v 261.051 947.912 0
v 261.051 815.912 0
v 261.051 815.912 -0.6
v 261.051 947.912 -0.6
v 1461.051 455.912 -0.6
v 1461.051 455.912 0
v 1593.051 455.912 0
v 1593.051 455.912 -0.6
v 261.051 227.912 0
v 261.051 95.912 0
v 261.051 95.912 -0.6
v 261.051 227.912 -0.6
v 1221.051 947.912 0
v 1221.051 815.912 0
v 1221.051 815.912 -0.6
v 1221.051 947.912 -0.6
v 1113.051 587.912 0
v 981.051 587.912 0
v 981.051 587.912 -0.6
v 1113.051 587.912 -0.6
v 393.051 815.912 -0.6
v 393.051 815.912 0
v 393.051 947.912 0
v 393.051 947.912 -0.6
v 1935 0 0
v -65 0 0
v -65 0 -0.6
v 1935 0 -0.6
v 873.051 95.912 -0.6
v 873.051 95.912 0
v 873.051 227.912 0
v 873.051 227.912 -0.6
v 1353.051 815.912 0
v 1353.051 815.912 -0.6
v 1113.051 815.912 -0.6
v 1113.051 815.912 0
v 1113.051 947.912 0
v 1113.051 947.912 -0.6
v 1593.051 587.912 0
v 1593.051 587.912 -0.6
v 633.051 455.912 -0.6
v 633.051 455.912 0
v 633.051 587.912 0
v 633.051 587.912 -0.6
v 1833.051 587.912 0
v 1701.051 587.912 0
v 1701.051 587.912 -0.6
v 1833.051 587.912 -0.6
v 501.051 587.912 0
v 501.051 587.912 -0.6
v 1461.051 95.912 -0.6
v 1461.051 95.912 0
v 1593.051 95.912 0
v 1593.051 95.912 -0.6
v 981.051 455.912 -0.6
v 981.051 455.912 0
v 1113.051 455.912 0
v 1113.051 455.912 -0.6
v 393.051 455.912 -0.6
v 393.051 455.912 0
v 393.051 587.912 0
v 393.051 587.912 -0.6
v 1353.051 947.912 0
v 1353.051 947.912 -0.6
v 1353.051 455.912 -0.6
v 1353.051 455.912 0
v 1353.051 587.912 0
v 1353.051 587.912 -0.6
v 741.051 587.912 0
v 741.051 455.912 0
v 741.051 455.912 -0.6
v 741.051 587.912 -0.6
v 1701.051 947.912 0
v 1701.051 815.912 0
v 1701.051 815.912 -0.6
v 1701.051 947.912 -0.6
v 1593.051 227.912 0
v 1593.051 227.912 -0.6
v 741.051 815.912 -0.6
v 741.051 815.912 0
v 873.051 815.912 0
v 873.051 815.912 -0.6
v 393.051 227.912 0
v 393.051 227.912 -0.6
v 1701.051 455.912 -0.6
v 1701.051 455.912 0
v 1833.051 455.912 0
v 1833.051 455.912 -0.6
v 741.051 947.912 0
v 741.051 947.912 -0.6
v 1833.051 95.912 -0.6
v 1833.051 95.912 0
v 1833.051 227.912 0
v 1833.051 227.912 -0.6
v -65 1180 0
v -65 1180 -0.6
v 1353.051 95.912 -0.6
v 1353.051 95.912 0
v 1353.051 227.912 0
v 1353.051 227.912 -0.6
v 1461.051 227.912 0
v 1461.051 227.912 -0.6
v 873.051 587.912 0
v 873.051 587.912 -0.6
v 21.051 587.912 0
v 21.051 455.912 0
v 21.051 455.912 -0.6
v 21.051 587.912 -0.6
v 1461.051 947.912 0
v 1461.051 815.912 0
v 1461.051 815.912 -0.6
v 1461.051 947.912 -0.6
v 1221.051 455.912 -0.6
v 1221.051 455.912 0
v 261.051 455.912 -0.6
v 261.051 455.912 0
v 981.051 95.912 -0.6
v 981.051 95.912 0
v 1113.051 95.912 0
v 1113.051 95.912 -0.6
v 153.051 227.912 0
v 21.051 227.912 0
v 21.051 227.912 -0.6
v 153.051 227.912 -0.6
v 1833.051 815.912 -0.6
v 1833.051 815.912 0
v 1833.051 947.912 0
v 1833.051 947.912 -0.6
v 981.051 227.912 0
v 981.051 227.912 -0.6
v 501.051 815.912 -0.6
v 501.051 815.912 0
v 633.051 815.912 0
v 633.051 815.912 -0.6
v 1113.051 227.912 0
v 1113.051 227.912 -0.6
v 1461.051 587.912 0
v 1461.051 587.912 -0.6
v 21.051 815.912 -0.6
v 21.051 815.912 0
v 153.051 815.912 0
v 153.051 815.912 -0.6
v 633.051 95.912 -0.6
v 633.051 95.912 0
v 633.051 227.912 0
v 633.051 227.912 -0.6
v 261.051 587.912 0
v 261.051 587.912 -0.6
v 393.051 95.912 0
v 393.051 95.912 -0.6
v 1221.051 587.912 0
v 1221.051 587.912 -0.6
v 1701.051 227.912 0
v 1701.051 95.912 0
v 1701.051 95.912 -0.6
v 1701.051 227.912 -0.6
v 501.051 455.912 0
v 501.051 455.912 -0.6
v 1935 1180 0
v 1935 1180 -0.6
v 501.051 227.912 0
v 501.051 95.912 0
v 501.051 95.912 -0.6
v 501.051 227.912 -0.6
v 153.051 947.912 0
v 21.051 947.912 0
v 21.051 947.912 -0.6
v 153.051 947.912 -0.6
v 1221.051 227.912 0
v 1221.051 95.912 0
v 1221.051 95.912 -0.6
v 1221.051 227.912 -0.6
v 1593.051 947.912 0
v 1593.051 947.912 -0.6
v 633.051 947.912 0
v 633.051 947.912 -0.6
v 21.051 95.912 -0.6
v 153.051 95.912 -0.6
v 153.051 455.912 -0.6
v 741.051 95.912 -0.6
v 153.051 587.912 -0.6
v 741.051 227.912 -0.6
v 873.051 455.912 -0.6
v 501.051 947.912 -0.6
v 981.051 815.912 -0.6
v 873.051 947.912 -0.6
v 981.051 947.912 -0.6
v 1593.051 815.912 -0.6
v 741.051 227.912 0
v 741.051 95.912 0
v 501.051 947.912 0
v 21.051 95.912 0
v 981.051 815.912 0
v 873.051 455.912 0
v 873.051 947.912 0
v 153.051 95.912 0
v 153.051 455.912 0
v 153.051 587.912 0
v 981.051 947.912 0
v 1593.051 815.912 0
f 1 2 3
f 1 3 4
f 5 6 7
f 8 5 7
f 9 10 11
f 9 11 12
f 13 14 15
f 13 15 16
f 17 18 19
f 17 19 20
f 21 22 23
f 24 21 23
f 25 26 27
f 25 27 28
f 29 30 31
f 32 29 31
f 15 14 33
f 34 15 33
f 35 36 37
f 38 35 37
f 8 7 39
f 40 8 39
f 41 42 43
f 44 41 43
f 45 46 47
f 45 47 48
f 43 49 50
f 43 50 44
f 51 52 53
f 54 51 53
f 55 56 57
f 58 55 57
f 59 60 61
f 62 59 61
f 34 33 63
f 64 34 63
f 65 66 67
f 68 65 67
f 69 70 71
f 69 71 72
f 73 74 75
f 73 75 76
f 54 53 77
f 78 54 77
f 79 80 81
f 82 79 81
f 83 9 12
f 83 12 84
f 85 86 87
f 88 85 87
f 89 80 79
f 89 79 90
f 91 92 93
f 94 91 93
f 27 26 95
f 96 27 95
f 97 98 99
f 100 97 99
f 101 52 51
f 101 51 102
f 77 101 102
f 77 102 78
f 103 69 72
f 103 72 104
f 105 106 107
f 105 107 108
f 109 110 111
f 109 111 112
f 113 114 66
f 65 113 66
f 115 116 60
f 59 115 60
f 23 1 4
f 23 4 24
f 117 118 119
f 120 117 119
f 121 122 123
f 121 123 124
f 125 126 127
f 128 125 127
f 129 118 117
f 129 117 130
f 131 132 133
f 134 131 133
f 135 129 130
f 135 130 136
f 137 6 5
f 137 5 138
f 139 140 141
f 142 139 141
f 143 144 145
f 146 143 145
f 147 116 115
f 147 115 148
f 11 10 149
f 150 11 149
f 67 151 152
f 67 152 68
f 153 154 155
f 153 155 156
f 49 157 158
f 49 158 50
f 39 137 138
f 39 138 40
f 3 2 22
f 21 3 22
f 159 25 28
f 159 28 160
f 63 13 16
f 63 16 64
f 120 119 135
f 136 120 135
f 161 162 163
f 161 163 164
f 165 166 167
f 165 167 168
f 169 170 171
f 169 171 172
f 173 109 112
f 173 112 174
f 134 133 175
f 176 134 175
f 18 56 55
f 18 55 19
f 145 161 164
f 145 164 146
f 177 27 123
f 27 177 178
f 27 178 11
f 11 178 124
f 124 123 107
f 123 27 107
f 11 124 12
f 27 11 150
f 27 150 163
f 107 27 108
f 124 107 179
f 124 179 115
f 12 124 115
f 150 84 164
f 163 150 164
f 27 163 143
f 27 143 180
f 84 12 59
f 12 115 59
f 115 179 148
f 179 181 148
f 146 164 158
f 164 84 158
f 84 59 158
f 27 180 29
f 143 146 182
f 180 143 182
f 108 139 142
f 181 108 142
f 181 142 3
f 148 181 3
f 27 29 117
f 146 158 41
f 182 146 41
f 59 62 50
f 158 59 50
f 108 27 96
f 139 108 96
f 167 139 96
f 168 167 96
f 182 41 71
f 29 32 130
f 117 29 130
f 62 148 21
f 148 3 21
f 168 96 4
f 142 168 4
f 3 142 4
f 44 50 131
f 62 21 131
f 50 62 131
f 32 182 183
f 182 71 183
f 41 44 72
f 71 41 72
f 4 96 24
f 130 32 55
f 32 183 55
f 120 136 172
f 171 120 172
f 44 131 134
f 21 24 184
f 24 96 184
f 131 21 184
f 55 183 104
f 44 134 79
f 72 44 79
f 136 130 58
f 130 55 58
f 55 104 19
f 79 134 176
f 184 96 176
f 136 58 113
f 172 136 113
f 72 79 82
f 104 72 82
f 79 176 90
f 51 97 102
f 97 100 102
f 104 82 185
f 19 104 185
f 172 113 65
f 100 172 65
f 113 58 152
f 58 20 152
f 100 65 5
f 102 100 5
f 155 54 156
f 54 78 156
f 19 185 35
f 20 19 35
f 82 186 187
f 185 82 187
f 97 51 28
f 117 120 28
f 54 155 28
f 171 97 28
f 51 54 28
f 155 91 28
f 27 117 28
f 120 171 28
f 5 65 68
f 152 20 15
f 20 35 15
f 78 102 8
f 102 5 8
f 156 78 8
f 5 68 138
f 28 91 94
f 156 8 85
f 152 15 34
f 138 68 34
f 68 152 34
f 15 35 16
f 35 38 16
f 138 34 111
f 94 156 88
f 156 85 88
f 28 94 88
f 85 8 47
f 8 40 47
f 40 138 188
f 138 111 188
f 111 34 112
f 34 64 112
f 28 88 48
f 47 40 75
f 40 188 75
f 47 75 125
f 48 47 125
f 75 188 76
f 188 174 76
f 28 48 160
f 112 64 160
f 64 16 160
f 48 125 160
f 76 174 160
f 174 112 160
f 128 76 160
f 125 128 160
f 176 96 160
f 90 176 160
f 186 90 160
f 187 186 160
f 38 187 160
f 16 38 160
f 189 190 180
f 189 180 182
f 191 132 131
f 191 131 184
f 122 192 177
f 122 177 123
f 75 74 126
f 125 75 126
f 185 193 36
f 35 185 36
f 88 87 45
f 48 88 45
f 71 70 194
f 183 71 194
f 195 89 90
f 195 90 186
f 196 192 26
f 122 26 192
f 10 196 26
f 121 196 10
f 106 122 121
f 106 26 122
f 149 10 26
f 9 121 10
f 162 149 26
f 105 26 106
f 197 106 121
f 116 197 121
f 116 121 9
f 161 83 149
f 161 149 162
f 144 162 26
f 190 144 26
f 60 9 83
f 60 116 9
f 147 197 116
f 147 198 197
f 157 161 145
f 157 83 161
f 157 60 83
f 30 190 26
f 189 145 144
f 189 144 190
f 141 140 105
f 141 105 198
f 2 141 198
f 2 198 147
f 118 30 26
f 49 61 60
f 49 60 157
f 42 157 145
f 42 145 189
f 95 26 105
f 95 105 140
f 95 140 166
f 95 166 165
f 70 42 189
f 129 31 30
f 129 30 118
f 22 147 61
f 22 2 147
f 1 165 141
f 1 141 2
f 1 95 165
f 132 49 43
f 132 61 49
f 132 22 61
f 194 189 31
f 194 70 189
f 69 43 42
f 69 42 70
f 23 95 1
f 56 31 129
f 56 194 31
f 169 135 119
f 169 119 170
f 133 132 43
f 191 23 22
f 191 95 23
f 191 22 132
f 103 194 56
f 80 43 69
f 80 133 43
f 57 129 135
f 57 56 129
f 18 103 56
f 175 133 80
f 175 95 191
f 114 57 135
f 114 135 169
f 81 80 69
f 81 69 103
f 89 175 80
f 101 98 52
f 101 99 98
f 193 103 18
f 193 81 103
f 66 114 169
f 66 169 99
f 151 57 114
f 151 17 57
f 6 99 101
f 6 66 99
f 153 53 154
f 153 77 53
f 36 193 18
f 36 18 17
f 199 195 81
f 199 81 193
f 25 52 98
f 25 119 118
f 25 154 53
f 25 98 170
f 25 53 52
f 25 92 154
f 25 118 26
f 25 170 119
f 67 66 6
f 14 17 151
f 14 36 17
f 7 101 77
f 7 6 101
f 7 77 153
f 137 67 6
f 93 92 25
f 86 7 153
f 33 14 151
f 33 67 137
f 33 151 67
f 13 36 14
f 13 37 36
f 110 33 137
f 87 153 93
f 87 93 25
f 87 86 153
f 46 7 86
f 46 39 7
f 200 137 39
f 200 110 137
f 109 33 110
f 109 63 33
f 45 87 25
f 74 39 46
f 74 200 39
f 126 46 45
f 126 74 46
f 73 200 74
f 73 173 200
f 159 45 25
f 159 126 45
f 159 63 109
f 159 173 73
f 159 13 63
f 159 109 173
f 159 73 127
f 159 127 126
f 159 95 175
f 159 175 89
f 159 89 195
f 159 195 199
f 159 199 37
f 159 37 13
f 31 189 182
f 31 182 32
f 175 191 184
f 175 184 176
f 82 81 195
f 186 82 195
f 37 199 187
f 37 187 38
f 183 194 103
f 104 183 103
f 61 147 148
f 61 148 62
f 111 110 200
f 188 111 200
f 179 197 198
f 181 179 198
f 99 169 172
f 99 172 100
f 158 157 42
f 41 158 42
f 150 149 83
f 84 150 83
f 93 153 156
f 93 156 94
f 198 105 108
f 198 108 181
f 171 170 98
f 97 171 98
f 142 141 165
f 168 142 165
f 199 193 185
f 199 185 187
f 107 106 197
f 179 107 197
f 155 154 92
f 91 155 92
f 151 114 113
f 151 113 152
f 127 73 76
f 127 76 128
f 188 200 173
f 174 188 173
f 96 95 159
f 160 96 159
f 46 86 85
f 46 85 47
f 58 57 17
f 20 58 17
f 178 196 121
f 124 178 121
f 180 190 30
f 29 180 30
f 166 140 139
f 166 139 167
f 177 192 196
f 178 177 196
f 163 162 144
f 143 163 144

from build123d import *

# Parameters (mm, degrees)
MODEL_W             = 1870
MODEL_H             = 1180
BASE_FLANGE1_DEPTH  = 0.6
TAB1_DEPTH          = 0.6
SKETCH7_W           = 65
SKETCH7_H           = 1180
TAB2_DEPTH          = 0.6
SKETCH9_W           = 1840.328960488
SKETCH9_H           = 1045.942358838
BOSS_EXTRUDE1_DEPTH = 0.6
SKETCH8_W           = 132
SKETCH8_H           = 132
CUT_EXTRUDE1_DEPTH  = 10


# Sheet-metal steps are written as plain solids
with BuildPart() as part:
    # Model → Base-Flange1 (new body)
    with BuildSketch(Plane.XY):
        with Locations((935, 590)):
            Rectangle(MODEL_W, MODEL_H)
        Polygon((1790, 440), (1640, 440), (1640, 595), (1650, 595), (1650, 662), (1780, 662), (1780, 595), (1790, 595), align=None, mode=Mode.SUBTRACT)
        Polygon((1595, 440), (1445, 440), (1445, 595), (1455, 595), (1455, 662), (1585, 662), (1585, 595), (1595, 595), align=None, mode=Mode.SUBTRACT)
        Polygon((1400, 440), (1250, 440), (1250, 595), (1260, 595), (1260, 662), (1390, 662), (1390, 595), (1400, 595), align=None, mode=Mode.SUBTRACT)
        Polygon((1205, 440), (1055, 440), (1055, 595), (1065, 595), (1065, 662), (1195, 662), (1195, 595), (1205, 595), align=None, mode=Mode.SUBTRACT)
        Polygon((1010, 440), (860, 440), (860, 595), (870, 595), (870, 662), (1000, 662), (1000, 595), (1010, 595), align=None, mode=Mode.SUBTRACT)
        Polygon((815, 440), (665, 440), (665, 595), (675, 595), (675, 662), (805, 662), (805, 595), (815, 595), align=None, mode=Mode.SUBTRACT)
        Polygon((620, 440), (470, 440), (470, 595), (480, 595), (480, 662), (610, 662), (610, 595), (620, 595), align=None, mode=Mode.SUBTRACT)
        Polygon((425, 440), (275, 440), (275, 595), (285, 595), (285, 662), (415, 662), (415, 595), (425, 595), align=None, mode=Mode.SUBTRACT)
        Polygon((230, 440), (80, 440), (80, 595), (90, 595), (90, 662), (220, 662), (220, 595), (230, 595), align=None, mode=Mode.SUBTRACT)
        Polygon((1790, 805), (1640, 805), (1640, 960), (1650, 960), (1650, 1027), (1780, 1027), (1780, 960), (1790, 960), align=None, mode=Mode.SUBTRACT)
        Polygon((1595, 805), (1445, 805), (1445, 960), (1455, 960), (1455, 1027), (1585, 1027), (1585, 960), (1595, 960), align=None, mode=Mode.SUBTRACT)
        Polygon((1400, 805), (1250, 805), (1250, 960), (1260, 960), (1260, 1027), (1390, 1027), (1390, 960), (1400, 960), align=None, mode=Mode.SUBTRACT)
        Polygon((1205, 805), (1055, 805), (1055, 960), (1065, 960), (1065, 1027), (1195, 1027), (1195, 960), (1205, 960), align=None, mode=Mode.SUBTRACT)
        Polygon((1010, 805), (860, 805), (860, 960), (870, 960), (870, 1027), (1000, 1027), (1000, 960), (1010, 960), align=None, mode=Mode.SUBTRACT)
        Polygon((815, 805), (665, 805), (665, 960), (675, 960), (675, 1027), (805, 1027), (805, 960), (815, 960), align=None, mode=Mode.SUBTRACT)
        Polygon((620, 805), (470, 805), (470, 960), (480, 960), (480, 1027), (610, 1027), (610, 960), (620, 960), align=None, mode=Mode.SUBTRACT)
        Polygon((425, 805), (275, 805), (275, 960), (285, 960), (285, 1027), (415, 1027), (415, 960), (425, 960), align=None, mode=Mode.SUBTRACT)
        Polygon((230, 805), (80, 805), (80, 960), (90, 960), (90, 1027), (220, 1027), (220, 960), (230, 960), align=None, mode=Mode.SUBTRACT)
        Polygon((1790, 75), (1640, 75), (1640, 230), (1650, 230), (1650, 297), (1780, 297), (1780, 230), (1790, 230), align=None, mode=Mode.SUBTRACT)
        Polygon((1595, 75), (1445, 75), (1445, 230), (1455, 230), (1455, 297), (1585, 297), (1585, 230), (1595, 230), align=None, mode=Mode.SUBTRACT)
        Polygon((1400, 75), (1250, 75), (1250, 230), (1260, 230), (1260, 297), (1390, 297), (1390, 230), (1400, 230), align=None, mode=Mode.SUBTRACT)
        Polygon((1205, 75), (1055, 75), (1055, 230), (1065, 230), (1065, 297), (1195, 297), (1195, 230), (1205, 230), align=None, mode=Mode.SUBTRACT)
        Polygon((1010, 75), (860, 75), (860, 230), (870, 230), (870, 297), (1000, 297), (1000, 230), (1010, 230), align=None, mode=Mode.SUBTRACT)
        Polygon((815, 75), (665, 75), (665, 230), (675, 230), (675, 297), (805, 297), (805, 230), (815, 230), align=None, mode=Mode.SUBTRACT)
        Polygon((620, 75), (470, 75), (470, 230), (480, 230), (480, 297), (610, 297), (610, 230), (620, 230), align=None, mode=Mode.SUBTRACT)
        Polygon((425, 75), (275, 75), (275, 230), (285, 230), (285, 297), (415, 297), (415, 230), (425, 230), align=None, mode=Mode.SUBTRACT)
        Polygon((230, 75), (80, 75), (80, 230), (90, 230), (90, 297), (220, 297), (220, 230), (230, 230), align=None, mode=Mode.SUBTRACT)
    extrude(amount=-BASE_FLANGE1_DEPTH)

    # Sketch6 → Tab1 (add)
    with BuildSketch(Plane.XY):
        Polygon((1705, 805), (1725, 805), (1725, 806), (1789, 806), (1789, 959), (1779, 959), (1779, 1026), (1725, 1026), (1725, 1027), (1705, 1027), (1705, 1026), (1651, 1026), (1651, 959), (1641, 959), (1641, 806), (1705, 806), align=None)
        Polygon((1705, 440), (1725, 440), (1725, 441), (1789, 441), (1789, 594), (1779, 594), (1779, 661), (1725, 661), (1725, 662), (1705, 662), (1705, 661), (1651, 661), (1651, 594), (1641, 594), (1641, 441), (1705, 441), align=None)
        Polygon((1705, 75), (1725, 75), (1725, 76), (1789, 76), (1789, 229), (1779, 229), (1779, 296), (1725, 296), (1725, 297), (1705, 297), (1705, 296), (1651, 296), (1651, 229), (1641, 229), (1641, 76), (1705, 76), align=None)
    extrude(amount=-TAB1_DEPTH)

    # Sketch7 → Tab2 (add)
    with BuildSketch(Plane.XY):
        with Locations((1902.5, 590)):
            Rectangle(SKETCH7_W, SKETCH7_H)
        with Locations((-32.5, 590)):
            Rectangle(SKETCH7_W, SKETCH7_H)
    extrude(amount=-TAB2_DEPTH)

    # Sketch9 → Boss-Extrude1 (add)
    with BuildSketch(Plane.XY):
        with Locations((950.64470062, 555.573524784)):
            Rectangle(SKETCH9_W, SKETCH9_H)
    extrude(amount=-BOSS_EXTRUDE1_DEPTH)

    # Sketch8 → Cut-Extrude1 (cut)
    with BuildSketch(Plane.XY):
        with Locations((1767.05073242, 881.911611336)):
            Rectangle(SKETCH8_W, SKETCH8_H)
        with Locations((1527.05073242, 881.911611336)):
            Rectangle(SKETCH8_W, SKETCH8_H)
        with Locations((1287.05073242, 881.911611336)):
            Rectangle(SKETCH8_W, SKETCH8_H)
        with Locations((1047.05073242, 881.911611336)):
            Rectangle(SKETCH8_W, SKETCH8_H)
        with Locations((807.05073242, 881.911611336)):
            Rectangle(SKETCH8_W, SKETCH8_H)
        with Locations((567.05073242, 881.911611336)):
            Rectangle(SKETCH8_W, SKETCH8_H)
        with Locations((327.05073242, 881.911611336)):
            Rectangle(SKETCH8_W, SKETCH8_H)
        with Locations((87.05073242, 881.911611336)):
            Rectangle(SKETCH8_W, SKETCH8_H)
        with Locations((1527.05073242, 521.911611336)):
            Rectangle(SKETCH8_W, SKETCH8_H)
        with Locations((1287.05073242, 521.911611336)):
            Rectangle(SKETCH8_W, SKETCH8_H)
        with Locations((1047.05073242, 521.911611336)):
            Rectangle(SKETCH8_W, SKETCH8_H)
        with Locations((807.05073242, 521.911611336)):
            Rectangle(SKETCH8_W, SKETCH8_H)
        with Locations((567.05073242, 521.911611336)):
            Rectangle(SKETCH8_W, SKETCH8_H)
        with Locations((327.05073242, 521.911611336)):
            Rectangle(SKETCH8_W, SKETCH8_H)
        with Locations((87.05073242, 521.911611336)):
            Rectangle(SKETCH8_W, SKETCH8_H)
        with Locations((1527.05073242, 161.911611336)):
            Rectangle(SKETCH8_W, SKETCH8_H)
        with Locations((1287.05073242, 161.911611336)):
            Rectangle(SKETCH8_W, SKETCH8_H)
        with Locations((1047.05073242, 161.911611336)):
            Rectangle(SKETCH8_W, SKETCH8_H)
        with Locations((807.05073242, 161.911611336)):
            Rectangle(SKETCH8_W, SKETCH8_H)
        with Locations((567.05073242, 161.911611336)):
            Rectangle(SKETCH8_W, SKETCH8_H)
        with Locations((327.05073242, 161.911611336)):
            Rectangle(SKETCH8_W, SKETCH8_H)
        with Locations((87.05073242, 161.911611336)):
            Rectangle(SKETCH8_W, SKETCH8_H)
        with Locations((1767.05073242, 521.911611336)):
            Rectangle(SKETCH8_W, SKETCH8_H)
        with Locations((1767.05073242, 161.911611336)):
            Rectangle(SKETCH8_W, SKETCH8_H)
    extrude(amount=-CUT_EXTRUDE1_DEPTH, mode=Mode.SUBTRACT)


solid = part.part
